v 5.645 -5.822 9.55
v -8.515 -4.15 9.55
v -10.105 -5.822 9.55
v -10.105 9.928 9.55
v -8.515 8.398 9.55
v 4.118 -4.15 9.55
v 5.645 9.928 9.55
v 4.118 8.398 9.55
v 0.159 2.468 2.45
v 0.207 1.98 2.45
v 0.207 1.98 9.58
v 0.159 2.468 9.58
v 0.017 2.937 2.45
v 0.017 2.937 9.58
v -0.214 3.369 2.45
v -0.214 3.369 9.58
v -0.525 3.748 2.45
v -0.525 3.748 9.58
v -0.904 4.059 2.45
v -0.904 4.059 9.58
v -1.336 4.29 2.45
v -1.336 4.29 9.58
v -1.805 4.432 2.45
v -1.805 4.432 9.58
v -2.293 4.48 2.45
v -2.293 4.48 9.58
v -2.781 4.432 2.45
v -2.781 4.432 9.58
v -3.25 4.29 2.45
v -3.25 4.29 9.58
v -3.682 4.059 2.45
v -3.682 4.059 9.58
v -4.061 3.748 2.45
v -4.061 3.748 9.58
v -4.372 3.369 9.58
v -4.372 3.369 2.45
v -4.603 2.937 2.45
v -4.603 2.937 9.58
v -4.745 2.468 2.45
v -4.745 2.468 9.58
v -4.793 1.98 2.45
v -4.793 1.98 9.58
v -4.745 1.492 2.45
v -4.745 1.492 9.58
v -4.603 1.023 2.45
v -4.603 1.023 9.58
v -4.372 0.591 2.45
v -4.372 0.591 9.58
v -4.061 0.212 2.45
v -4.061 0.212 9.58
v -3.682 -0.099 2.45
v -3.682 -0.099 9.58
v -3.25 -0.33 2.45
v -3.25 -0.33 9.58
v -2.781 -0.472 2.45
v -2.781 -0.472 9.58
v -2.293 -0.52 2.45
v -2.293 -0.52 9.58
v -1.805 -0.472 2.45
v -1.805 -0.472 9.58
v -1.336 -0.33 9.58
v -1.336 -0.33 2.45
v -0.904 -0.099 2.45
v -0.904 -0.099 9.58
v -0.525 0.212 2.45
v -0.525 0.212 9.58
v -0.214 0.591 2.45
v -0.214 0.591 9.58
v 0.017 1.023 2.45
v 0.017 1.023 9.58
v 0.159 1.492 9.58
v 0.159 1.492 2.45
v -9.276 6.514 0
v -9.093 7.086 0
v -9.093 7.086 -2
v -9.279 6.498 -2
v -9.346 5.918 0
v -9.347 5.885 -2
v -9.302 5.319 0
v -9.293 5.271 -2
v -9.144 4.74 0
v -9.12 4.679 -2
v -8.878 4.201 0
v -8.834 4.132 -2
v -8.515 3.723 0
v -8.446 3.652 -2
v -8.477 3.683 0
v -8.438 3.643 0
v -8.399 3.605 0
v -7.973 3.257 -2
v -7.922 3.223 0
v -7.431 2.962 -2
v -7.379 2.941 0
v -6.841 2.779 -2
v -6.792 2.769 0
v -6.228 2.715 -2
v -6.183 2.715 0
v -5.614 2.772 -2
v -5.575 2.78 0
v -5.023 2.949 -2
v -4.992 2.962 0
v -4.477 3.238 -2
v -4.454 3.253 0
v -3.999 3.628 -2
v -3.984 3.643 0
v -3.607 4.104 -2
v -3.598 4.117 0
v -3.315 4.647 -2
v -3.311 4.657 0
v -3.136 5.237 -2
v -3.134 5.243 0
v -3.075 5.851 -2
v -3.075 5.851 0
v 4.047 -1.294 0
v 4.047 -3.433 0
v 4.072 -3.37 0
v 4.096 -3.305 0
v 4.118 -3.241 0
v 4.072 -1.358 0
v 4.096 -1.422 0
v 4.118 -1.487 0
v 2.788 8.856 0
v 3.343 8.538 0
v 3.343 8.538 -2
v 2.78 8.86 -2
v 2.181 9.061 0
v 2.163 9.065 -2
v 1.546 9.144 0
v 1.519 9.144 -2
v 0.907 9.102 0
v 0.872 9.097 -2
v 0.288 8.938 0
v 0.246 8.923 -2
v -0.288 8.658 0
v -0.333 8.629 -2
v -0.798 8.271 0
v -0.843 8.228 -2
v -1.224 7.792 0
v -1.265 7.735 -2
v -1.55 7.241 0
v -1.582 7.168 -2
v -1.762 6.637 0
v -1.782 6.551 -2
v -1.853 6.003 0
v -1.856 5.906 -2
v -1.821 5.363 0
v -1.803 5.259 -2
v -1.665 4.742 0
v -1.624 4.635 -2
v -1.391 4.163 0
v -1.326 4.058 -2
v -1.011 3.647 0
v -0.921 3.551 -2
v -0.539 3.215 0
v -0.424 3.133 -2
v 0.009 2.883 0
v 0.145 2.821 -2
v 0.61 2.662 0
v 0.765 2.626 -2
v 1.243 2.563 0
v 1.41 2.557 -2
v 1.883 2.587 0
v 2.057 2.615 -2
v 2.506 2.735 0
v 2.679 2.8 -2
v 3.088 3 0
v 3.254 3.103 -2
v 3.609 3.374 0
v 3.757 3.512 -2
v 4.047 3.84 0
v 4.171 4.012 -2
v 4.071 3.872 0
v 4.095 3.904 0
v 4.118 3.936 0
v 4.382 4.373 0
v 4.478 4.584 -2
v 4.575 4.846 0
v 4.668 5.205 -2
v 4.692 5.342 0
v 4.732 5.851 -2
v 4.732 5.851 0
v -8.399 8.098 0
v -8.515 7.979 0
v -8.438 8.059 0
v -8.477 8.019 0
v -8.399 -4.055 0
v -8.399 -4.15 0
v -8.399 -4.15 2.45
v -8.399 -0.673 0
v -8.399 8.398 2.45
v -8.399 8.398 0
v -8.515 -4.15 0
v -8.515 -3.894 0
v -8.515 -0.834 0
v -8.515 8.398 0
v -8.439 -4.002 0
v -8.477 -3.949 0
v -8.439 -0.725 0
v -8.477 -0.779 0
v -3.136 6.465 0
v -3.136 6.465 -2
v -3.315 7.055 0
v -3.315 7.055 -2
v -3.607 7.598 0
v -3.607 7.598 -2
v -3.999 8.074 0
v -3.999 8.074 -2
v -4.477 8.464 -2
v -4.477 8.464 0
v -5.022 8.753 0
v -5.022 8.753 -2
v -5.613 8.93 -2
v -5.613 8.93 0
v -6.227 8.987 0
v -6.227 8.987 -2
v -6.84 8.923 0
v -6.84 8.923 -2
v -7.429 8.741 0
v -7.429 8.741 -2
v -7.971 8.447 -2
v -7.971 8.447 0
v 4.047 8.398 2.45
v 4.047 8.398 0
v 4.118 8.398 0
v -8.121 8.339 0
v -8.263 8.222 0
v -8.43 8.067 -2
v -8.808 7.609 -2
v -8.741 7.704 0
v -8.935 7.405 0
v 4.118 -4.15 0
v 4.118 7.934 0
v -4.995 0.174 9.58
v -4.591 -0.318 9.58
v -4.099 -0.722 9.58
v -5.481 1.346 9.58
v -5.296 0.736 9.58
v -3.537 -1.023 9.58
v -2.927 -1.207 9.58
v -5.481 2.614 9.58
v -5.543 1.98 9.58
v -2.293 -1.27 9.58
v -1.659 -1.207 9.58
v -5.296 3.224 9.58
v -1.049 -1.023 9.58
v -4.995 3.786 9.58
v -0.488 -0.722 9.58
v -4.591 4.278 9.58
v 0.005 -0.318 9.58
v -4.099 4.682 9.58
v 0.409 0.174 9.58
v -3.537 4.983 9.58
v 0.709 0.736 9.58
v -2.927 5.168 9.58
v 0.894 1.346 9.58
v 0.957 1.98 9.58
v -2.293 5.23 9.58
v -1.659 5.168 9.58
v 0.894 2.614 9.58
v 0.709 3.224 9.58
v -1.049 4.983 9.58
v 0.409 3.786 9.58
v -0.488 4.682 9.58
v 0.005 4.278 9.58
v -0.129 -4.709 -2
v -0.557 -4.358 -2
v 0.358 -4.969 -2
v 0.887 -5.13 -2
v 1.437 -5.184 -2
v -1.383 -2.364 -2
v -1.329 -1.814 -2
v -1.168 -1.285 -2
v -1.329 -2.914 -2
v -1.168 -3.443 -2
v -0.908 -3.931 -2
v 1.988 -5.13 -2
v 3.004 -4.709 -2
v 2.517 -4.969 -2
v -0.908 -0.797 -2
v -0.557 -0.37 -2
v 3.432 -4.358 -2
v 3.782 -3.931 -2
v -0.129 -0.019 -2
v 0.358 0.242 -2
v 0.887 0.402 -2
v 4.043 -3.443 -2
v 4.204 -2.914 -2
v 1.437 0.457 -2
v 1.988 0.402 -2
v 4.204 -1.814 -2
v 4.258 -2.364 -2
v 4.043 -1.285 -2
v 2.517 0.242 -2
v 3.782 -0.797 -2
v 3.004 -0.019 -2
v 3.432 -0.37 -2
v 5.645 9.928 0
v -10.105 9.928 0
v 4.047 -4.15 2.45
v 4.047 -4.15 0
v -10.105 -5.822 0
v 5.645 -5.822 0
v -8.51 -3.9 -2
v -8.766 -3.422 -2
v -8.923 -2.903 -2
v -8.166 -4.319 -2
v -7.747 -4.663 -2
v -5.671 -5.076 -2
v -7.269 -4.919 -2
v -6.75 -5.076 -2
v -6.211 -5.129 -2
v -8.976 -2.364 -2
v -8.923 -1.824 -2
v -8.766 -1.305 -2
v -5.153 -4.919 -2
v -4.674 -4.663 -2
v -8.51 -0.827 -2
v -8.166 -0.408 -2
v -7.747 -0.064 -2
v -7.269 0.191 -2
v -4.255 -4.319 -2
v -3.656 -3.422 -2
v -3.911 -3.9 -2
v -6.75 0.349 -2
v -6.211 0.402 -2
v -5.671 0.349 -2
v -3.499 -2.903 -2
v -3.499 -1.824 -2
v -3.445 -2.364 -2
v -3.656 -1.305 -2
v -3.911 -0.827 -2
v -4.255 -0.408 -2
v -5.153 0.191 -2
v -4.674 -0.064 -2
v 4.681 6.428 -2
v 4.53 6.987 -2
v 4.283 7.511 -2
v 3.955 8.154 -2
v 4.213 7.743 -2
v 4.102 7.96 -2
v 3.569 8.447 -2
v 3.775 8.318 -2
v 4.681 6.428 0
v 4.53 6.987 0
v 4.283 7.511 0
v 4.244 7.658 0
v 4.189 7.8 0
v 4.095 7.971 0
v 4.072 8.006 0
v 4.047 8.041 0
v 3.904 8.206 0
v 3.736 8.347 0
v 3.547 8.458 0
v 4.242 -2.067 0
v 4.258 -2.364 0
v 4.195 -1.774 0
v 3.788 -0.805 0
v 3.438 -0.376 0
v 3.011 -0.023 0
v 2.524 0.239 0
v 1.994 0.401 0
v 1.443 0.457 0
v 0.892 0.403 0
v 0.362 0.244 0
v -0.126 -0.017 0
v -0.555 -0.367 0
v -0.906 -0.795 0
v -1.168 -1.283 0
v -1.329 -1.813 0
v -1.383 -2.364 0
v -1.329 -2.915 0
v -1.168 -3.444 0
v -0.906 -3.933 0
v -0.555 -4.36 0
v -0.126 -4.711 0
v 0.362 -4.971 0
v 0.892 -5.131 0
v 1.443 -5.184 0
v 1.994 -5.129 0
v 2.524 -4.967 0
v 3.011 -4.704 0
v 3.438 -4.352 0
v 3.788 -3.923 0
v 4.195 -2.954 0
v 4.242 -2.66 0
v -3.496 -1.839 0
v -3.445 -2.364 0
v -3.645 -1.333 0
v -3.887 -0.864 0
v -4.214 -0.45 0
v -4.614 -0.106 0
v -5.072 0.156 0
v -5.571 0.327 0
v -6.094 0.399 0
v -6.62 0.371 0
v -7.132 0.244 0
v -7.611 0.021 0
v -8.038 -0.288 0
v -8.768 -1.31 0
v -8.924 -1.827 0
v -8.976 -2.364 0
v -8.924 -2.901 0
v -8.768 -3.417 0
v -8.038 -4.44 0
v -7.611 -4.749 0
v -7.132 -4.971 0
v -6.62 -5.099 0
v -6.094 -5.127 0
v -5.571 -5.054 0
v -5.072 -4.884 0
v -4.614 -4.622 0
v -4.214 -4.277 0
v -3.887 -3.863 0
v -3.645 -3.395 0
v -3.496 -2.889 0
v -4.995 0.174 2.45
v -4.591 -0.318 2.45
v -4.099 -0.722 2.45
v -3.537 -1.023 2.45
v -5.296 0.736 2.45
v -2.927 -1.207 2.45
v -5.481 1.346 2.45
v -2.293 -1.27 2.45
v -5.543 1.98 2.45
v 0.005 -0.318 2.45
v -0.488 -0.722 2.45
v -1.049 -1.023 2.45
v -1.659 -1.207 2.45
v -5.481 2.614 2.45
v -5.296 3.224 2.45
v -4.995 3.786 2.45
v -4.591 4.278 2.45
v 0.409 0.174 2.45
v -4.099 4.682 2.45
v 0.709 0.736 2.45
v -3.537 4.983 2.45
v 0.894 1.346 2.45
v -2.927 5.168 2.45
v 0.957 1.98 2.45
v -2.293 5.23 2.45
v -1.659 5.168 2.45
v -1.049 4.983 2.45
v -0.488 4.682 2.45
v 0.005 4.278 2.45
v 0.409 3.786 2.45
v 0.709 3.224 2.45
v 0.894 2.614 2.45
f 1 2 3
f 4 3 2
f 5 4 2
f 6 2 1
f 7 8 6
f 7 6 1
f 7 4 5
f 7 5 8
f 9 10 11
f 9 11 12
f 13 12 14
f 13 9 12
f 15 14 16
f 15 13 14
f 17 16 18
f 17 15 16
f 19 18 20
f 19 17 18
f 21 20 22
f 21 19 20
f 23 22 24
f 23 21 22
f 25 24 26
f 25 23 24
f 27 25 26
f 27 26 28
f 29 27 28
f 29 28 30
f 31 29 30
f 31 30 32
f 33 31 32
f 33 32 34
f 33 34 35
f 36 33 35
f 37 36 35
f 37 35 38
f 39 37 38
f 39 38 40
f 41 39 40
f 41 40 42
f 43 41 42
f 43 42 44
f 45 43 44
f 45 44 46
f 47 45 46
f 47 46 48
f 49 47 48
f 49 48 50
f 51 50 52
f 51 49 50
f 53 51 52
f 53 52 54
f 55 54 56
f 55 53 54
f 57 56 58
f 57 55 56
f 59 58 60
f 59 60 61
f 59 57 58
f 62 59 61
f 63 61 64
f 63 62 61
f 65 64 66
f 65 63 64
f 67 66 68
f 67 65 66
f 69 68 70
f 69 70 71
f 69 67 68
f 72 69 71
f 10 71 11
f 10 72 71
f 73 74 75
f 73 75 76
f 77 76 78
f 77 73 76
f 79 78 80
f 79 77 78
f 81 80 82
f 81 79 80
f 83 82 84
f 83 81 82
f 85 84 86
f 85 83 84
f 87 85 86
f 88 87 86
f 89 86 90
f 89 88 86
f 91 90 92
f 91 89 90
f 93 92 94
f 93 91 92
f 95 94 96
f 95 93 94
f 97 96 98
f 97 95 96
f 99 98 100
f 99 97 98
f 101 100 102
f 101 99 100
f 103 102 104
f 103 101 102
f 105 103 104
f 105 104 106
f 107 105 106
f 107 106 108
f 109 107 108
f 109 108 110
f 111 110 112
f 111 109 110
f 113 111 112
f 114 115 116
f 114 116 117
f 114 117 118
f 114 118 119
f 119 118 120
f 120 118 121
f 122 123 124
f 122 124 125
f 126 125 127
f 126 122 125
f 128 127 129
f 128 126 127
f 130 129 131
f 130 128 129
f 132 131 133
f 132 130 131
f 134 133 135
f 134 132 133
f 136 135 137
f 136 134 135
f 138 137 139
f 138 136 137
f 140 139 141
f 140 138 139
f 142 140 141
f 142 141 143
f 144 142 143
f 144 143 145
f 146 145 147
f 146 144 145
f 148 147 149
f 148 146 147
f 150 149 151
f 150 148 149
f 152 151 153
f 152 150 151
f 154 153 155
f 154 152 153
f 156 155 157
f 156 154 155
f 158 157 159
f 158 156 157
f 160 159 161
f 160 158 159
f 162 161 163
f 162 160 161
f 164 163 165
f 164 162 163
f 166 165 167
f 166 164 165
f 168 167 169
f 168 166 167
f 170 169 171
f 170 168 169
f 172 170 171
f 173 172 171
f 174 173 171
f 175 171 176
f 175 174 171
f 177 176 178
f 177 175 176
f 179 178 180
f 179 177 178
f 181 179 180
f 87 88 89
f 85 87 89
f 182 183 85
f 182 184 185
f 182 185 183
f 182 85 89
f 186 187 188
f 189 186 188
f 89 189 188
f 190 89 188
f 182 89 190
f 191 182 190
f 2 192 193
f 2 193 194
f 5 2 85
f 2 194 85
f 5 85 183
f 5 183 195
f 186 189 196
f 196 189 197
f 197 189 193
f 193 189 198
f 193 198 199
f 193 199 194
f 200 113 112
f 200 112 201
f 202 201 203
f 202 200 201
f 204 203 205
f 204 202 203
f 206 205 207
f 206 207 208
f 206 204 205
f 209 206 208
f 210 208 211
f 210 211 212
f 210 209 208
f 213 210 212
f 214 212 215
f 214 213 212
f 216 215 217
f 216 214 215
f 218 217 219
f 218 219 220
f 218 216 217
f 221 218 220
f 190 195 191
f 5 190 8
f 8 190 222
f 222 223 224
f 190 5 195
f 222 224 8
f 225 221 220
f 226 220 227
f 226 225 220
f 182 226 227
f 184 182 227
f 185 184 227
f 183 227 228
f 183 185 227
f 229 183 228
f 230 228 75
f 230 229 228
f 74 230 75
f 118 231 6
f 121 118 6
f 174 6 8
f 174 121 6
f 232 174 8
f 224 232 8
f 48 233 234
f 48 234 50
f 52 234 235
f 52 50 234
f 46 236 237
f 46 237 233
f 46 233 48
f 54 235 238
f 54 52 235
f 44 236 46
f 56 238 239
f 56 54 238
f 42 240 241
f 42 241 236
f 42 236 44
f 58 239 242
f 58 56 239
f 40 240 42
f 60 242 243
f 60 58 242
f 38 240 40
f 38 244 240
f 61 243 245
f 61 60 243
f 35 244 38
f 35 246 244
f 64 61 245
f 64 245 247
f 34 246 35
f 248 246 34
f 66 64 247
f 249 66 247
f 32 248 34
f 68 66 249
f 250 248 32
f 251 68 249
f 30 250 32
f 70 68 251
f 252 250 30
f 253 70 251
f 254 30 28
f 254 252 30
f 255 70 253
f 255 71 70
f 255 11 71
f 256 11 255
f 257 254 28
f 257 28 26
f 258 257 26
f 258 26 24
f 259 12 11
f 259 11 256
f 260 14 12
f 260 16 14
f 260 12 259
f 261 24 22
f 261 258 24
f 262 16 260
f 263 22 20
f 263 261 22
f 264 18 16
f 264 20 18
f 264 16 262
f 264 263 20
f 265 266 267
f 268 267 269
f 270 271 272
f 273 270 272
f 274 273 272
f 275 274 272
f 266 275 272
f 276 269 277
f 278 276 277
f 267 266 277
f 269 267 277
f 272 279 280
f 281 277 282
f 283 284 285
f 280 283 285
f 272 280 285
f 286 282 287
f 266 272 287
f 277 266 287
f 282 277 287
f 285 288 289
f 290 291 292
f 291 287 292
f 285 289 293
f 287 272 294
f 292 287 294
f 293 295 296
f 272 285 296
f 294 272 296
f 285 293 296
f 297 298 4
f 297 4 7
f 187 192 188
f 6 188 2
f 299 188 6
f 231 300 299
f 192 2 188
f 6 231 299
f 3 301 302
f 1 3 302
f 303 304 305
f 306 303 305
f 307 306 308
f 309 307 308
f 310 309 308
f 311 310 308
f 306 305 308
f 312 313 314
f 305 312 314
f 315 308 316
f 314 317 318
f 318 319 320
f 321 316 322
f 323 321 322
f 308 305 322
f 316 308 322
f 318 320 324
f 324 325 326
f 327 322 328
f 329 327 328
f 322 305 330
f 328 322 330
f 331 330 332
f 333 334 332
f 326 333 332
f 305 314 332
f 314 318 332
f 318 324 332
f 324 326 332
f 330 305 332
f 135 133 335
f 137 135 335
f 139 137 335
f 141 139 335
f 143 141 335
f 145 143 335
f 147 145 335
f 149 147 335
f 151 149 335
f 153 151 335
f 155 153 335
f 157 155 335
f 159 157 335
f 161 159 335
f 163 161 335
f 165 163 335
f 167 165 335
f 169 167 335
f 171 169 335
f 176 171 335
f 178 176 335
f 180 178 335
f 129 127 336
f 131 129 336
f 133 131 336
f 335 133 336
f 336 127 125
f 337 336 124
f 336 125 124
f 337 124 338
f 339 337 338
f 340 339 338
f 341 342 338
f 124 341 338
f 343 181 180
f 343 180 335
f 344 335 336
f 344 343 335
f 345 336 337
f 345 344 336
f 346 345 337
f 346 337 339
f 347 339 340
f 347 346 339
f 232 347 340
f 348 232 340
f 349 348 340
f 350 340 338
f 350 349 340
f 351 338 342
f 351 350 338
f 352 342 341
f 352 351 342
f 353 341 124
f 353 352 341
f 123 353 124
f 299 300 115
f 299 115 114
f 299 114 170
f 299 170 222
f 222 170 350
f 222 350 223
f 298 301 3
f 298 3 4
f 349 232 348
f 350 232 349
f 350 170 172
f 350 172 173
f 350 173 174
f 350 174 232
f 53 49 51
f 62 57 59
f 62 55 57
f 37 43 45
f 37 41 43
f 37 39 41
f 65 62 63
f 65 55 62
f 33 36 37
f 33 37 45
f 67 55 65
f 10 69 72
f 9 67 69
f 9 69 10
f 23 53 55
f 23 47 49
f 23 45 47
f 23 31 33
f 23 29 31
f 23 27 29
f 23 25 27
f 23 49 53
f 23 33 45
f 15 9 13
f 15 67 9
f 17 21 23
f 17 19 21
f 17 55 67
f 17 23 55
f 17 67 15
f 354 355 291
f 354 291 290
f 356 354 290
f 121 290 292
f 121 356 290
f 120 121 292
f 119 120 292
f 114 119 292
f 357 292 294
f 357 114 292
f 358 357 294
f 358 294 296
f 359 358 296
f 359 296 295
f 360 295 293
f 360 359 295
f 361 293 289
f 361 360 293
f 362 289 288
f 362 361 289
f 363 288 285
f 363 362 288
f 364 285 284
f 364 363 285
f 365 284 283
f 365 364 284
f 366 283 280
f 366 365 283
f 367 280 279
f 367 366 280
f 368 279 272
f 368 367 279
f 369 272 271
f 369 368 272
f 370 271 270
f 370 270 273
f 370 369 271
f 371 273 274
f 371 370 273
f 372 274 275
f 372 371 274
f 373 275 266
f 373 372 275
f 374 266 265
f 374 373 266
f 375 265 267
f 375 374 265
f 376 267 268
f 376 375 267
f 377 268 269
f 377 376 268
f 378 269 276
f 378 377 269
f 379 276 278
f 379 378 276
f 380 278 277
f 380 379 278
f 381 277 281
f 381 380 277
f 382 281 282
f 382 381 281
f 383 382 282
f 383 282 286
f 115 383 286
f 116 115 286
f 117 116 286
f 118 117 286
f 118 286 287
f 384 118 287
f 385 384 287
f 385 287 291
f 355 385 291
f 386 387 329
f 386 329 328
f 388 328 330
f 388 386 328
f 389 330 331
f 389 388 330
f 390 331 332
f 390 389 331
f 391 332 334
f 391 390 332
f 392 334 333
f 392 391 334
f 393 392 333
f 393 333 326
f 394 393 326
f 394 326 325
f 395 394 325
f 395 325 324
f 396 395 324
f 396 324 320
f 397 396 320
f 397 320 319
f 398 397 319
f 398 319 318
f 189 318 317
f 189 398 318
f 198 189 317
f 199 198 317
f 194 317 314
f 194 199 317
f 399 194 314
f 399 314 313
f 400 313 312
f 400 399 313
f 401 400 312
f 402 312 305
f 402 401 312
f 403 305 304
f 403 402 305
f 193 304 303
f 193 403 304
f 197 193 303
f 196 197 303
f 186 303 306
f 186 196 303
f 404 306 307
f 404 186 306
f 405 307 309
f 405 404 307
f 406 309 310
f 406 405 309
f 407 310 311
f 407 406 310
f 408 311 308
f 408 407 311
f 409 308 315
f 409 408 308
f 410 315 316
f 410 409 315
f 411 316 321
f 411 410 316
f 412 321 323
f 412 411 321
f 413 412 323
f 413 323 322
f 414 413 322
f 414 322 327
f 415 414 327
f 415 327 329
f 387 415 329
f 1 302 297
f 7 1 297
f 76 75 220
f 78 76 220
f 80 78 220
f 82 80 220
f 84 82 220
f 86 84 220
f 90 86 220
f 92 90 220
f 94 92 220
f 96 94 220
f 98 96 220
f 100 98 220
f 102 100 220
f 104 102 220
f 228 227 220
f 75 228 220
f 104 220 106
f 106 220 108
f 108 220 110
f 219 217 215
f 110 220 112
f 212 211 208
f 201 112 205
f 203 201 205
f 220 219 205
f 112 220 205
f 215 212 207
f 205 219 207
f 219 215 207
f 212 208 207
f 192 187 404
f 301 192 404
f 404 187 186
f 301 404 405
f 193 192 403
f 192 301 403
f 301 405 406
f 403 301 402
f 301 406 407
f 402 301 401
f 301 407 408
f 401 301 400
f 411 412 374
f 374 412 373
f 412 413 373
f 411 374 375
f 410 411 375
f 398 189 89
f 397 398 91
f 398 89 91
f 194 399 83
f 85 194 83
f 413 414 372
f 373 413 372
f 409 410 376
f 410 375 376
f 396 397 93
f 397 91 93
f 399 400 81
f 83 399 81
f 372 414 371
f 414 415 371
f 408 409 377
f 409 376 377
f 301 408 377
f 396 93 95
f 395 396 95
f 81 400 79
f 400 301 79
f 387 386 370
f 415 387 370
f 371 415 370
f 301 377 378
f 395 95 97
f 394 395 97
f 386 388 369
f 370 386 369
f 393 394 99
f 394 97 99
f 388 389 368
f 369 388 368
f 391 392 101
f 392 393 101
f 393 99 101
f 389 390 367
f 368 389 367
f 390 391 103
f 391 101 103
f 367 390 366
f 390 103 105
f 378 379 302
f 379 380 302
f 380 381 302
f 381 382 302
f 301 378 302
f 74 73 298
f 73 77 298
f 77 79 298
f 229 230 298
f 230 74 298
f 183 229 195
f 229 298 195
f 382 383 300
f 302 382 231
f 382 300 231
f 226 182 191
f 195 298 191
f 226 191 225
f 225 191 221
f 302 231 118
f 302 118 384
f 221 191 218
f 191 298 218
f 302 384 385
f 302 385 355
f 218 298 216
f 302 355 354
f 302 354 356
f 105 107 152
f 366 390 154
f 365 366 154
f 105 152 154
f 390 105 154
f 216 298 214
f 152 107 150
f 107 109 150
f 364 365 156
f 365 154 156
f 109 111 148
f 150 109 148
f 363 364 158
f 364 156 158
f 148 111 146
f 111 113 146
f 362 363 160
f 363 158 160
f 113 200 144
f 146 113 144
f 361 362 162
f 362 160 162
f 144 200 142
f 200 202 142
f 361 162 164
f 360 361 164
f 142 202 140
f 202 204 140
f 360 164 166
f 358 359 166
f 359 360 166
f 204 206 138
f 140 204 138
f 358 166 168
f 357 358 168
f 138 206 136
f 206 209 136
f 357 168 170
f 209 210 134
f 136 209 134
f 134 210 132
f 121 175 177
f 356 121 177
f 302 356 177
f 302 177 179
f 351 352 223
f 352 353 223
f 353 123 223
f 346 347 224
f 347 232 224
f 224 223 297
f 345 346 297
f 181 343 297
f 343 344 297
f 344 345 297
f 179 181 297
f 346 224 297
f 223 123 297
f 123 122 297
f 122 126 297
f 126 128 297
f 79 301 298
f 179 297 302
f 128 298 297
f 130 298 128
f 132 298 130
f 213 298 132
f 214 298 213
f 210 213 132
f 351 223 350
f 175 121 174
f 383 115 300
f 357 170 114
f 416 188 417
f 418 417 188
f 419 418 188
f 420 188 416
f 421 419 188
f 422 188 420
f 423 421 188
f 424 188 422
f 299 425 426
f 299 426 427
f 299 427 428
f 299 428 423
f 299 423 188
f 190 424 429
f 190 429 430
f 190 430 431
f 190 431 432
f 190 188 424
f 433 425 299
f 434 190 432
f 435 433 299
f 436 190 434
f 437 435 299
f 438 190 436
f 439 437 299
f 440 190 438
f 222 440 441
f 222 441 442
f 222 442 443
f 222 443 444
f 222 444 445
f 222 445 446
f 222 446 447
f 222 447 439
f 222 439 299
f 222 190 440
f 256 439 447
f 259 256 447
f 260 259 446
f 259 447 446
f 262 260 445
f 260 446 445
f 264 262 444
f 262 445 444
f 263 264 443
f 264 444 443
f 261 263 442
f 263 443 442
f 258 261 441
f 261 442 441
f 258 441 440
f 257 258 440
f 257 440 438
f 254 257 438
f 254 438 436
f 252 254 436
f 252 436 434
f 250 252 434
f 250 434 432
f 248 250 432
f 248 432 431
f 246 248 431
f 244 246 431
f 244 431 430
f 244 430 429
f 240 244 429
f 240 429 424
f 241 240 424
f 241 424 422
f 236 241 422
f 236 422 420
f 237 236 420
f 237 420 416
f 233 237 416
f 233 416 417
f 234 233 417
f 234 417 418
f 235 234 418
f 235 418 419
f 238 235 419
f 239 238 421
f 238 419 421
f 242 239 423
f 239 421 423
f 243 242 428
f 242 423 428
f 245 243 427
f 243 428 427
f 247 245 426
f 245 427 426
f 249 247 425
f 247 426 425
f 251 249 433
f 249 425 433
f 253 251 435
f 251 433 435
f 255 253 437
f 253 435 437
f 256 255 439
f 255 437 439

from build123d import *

# Parameters (mm, degrees)
F0_W     = 15.75
F0_H     = 15.75
F1_DEPTH = 9.55
F2_R     = 2.7655447365
F2_R_2   = 2.8203135122
F3_DEPTH = 2
F4_W     = 12.6326526515
F4_H     = 12.5484350137
F5_DEPTH = 10
F6_W     = 12.4461371452
F6_H     = 12.6247890294
F7_DEPTH = 2.45
F8_R     = 3.25
F8_R_2   = 2.5
F9_DEPTH = 9.58


with BuildPart() as f1:
    # F0 (on Top) → F1 (new body)
    with BuildSketch(Plane.XY):
        with Locations((-2.2300542332, 2.0526186563)):
            Rectangle(F0_W, F0_H)
    extrude(amount=F1_DEPTH)

    # F2 (on Top) → F3 (join)
    with BuildSketch(Plane.XY):
        with BuildLine():
            ThreePointArc((3.3434472608, 8.5381525556), (1.8563335854, 6.422431468), (4.3116325752, 7.2343980162))
            ThreePointArc((4.3116325752, 7.2343980162), (4.3045378825, 7.37322994), (4.2833277224, 7.5106154081))
            ThreePointArc((4.2833277224, 7.5106154081), (3.8683009231, 8.0746128825), (3.3434472608, 8.5381525556))
        make_face()
        with BuildLine():
            ThreePointArc((4.2833277224, 7.5106154081), (4.3045378825, 7.37322994), (4.3116325752, 7.2343980162))
            ThreePointArc((4.3116325752, 7.2343980162), (1.8563335854, 6.422431468), (3.3434472608, 8.5381525556))
            ThreePointArc((3.3434472608, 8.5381525556), (-1.4893392185, 4.3388645246), (4.7318274849, 5.8511244133))
            ThreePointArc((4.7318274849, 5.8511244133), (4.6177266052, 6.7106391599), (4.2833277224, 7.5106154081))
        make_face()
        with BuildLine():
            ThreePointArc((3.3434472608, 8.5381525556), (3.8683009231, 8.0746128825), (4.2833277224, 7.5106154081))
            ThreePointArc((4.2833277224, 7.5106154081), (3.95464834, 8.1535942121), (3.3434472608, 8.5381525556))
        make_face()
        with BuildLine():
            ThreePointArc((-9.0934361556, 7.0864772246), (-6.8414931871, 2.7791078741), (-3.0748776986, 5.8511244133))
            ThreePointArc((-3.0748776986, 5.8511244133), (-4.7421559795, 8.6219651826), (-7.9711833661, 8.4465868163))
            ThreePointArc((-7.9711833661, 8.4465868163), (-8.6298719943, 7.8470325105), (-9.0934361556, 7.0864772246))
        make_face()
        with Locations((-6.210939493, -2.3638040293)):
            Circle(F2_R)
        with Locations((1.4374417951, -2.3638040293)):
            Circle(F2_R_2)
    extrude(amount=-F3_DEPTH)

    # F4 (on Top) → F5 (cut)
    with BuildSketch(Plane.XY):
        with Locations((-2.1983480547, 2.12413189)):
            Rectangle(F4_W, F4_H)
    extrude(amount=F5_DEPTH, mode=Mode.SUBTRACT)

    # F6 (on Top) → F7 (join)
    with BuildSketch(Plane.XY):
        with Locations((-2.1759783849, 2.0920559764)):
            Rectangle(F6_W, F6_H)
    extrude(amount=F7_DEPTH)

    # F8 (on Top) → F9 (join)
    with BuildSketch(Plane.XY):
        with Locations((-2.2931566928, 1.9800718874)):
            Circle(F8_R)
        with Locations((-2.2931566928, 1.9800718874)):
            Circle(F8_R_2, mode=Mode.SUBTRACT)
    extrude(amount=F9_DEPTH)


solid = f1.part
